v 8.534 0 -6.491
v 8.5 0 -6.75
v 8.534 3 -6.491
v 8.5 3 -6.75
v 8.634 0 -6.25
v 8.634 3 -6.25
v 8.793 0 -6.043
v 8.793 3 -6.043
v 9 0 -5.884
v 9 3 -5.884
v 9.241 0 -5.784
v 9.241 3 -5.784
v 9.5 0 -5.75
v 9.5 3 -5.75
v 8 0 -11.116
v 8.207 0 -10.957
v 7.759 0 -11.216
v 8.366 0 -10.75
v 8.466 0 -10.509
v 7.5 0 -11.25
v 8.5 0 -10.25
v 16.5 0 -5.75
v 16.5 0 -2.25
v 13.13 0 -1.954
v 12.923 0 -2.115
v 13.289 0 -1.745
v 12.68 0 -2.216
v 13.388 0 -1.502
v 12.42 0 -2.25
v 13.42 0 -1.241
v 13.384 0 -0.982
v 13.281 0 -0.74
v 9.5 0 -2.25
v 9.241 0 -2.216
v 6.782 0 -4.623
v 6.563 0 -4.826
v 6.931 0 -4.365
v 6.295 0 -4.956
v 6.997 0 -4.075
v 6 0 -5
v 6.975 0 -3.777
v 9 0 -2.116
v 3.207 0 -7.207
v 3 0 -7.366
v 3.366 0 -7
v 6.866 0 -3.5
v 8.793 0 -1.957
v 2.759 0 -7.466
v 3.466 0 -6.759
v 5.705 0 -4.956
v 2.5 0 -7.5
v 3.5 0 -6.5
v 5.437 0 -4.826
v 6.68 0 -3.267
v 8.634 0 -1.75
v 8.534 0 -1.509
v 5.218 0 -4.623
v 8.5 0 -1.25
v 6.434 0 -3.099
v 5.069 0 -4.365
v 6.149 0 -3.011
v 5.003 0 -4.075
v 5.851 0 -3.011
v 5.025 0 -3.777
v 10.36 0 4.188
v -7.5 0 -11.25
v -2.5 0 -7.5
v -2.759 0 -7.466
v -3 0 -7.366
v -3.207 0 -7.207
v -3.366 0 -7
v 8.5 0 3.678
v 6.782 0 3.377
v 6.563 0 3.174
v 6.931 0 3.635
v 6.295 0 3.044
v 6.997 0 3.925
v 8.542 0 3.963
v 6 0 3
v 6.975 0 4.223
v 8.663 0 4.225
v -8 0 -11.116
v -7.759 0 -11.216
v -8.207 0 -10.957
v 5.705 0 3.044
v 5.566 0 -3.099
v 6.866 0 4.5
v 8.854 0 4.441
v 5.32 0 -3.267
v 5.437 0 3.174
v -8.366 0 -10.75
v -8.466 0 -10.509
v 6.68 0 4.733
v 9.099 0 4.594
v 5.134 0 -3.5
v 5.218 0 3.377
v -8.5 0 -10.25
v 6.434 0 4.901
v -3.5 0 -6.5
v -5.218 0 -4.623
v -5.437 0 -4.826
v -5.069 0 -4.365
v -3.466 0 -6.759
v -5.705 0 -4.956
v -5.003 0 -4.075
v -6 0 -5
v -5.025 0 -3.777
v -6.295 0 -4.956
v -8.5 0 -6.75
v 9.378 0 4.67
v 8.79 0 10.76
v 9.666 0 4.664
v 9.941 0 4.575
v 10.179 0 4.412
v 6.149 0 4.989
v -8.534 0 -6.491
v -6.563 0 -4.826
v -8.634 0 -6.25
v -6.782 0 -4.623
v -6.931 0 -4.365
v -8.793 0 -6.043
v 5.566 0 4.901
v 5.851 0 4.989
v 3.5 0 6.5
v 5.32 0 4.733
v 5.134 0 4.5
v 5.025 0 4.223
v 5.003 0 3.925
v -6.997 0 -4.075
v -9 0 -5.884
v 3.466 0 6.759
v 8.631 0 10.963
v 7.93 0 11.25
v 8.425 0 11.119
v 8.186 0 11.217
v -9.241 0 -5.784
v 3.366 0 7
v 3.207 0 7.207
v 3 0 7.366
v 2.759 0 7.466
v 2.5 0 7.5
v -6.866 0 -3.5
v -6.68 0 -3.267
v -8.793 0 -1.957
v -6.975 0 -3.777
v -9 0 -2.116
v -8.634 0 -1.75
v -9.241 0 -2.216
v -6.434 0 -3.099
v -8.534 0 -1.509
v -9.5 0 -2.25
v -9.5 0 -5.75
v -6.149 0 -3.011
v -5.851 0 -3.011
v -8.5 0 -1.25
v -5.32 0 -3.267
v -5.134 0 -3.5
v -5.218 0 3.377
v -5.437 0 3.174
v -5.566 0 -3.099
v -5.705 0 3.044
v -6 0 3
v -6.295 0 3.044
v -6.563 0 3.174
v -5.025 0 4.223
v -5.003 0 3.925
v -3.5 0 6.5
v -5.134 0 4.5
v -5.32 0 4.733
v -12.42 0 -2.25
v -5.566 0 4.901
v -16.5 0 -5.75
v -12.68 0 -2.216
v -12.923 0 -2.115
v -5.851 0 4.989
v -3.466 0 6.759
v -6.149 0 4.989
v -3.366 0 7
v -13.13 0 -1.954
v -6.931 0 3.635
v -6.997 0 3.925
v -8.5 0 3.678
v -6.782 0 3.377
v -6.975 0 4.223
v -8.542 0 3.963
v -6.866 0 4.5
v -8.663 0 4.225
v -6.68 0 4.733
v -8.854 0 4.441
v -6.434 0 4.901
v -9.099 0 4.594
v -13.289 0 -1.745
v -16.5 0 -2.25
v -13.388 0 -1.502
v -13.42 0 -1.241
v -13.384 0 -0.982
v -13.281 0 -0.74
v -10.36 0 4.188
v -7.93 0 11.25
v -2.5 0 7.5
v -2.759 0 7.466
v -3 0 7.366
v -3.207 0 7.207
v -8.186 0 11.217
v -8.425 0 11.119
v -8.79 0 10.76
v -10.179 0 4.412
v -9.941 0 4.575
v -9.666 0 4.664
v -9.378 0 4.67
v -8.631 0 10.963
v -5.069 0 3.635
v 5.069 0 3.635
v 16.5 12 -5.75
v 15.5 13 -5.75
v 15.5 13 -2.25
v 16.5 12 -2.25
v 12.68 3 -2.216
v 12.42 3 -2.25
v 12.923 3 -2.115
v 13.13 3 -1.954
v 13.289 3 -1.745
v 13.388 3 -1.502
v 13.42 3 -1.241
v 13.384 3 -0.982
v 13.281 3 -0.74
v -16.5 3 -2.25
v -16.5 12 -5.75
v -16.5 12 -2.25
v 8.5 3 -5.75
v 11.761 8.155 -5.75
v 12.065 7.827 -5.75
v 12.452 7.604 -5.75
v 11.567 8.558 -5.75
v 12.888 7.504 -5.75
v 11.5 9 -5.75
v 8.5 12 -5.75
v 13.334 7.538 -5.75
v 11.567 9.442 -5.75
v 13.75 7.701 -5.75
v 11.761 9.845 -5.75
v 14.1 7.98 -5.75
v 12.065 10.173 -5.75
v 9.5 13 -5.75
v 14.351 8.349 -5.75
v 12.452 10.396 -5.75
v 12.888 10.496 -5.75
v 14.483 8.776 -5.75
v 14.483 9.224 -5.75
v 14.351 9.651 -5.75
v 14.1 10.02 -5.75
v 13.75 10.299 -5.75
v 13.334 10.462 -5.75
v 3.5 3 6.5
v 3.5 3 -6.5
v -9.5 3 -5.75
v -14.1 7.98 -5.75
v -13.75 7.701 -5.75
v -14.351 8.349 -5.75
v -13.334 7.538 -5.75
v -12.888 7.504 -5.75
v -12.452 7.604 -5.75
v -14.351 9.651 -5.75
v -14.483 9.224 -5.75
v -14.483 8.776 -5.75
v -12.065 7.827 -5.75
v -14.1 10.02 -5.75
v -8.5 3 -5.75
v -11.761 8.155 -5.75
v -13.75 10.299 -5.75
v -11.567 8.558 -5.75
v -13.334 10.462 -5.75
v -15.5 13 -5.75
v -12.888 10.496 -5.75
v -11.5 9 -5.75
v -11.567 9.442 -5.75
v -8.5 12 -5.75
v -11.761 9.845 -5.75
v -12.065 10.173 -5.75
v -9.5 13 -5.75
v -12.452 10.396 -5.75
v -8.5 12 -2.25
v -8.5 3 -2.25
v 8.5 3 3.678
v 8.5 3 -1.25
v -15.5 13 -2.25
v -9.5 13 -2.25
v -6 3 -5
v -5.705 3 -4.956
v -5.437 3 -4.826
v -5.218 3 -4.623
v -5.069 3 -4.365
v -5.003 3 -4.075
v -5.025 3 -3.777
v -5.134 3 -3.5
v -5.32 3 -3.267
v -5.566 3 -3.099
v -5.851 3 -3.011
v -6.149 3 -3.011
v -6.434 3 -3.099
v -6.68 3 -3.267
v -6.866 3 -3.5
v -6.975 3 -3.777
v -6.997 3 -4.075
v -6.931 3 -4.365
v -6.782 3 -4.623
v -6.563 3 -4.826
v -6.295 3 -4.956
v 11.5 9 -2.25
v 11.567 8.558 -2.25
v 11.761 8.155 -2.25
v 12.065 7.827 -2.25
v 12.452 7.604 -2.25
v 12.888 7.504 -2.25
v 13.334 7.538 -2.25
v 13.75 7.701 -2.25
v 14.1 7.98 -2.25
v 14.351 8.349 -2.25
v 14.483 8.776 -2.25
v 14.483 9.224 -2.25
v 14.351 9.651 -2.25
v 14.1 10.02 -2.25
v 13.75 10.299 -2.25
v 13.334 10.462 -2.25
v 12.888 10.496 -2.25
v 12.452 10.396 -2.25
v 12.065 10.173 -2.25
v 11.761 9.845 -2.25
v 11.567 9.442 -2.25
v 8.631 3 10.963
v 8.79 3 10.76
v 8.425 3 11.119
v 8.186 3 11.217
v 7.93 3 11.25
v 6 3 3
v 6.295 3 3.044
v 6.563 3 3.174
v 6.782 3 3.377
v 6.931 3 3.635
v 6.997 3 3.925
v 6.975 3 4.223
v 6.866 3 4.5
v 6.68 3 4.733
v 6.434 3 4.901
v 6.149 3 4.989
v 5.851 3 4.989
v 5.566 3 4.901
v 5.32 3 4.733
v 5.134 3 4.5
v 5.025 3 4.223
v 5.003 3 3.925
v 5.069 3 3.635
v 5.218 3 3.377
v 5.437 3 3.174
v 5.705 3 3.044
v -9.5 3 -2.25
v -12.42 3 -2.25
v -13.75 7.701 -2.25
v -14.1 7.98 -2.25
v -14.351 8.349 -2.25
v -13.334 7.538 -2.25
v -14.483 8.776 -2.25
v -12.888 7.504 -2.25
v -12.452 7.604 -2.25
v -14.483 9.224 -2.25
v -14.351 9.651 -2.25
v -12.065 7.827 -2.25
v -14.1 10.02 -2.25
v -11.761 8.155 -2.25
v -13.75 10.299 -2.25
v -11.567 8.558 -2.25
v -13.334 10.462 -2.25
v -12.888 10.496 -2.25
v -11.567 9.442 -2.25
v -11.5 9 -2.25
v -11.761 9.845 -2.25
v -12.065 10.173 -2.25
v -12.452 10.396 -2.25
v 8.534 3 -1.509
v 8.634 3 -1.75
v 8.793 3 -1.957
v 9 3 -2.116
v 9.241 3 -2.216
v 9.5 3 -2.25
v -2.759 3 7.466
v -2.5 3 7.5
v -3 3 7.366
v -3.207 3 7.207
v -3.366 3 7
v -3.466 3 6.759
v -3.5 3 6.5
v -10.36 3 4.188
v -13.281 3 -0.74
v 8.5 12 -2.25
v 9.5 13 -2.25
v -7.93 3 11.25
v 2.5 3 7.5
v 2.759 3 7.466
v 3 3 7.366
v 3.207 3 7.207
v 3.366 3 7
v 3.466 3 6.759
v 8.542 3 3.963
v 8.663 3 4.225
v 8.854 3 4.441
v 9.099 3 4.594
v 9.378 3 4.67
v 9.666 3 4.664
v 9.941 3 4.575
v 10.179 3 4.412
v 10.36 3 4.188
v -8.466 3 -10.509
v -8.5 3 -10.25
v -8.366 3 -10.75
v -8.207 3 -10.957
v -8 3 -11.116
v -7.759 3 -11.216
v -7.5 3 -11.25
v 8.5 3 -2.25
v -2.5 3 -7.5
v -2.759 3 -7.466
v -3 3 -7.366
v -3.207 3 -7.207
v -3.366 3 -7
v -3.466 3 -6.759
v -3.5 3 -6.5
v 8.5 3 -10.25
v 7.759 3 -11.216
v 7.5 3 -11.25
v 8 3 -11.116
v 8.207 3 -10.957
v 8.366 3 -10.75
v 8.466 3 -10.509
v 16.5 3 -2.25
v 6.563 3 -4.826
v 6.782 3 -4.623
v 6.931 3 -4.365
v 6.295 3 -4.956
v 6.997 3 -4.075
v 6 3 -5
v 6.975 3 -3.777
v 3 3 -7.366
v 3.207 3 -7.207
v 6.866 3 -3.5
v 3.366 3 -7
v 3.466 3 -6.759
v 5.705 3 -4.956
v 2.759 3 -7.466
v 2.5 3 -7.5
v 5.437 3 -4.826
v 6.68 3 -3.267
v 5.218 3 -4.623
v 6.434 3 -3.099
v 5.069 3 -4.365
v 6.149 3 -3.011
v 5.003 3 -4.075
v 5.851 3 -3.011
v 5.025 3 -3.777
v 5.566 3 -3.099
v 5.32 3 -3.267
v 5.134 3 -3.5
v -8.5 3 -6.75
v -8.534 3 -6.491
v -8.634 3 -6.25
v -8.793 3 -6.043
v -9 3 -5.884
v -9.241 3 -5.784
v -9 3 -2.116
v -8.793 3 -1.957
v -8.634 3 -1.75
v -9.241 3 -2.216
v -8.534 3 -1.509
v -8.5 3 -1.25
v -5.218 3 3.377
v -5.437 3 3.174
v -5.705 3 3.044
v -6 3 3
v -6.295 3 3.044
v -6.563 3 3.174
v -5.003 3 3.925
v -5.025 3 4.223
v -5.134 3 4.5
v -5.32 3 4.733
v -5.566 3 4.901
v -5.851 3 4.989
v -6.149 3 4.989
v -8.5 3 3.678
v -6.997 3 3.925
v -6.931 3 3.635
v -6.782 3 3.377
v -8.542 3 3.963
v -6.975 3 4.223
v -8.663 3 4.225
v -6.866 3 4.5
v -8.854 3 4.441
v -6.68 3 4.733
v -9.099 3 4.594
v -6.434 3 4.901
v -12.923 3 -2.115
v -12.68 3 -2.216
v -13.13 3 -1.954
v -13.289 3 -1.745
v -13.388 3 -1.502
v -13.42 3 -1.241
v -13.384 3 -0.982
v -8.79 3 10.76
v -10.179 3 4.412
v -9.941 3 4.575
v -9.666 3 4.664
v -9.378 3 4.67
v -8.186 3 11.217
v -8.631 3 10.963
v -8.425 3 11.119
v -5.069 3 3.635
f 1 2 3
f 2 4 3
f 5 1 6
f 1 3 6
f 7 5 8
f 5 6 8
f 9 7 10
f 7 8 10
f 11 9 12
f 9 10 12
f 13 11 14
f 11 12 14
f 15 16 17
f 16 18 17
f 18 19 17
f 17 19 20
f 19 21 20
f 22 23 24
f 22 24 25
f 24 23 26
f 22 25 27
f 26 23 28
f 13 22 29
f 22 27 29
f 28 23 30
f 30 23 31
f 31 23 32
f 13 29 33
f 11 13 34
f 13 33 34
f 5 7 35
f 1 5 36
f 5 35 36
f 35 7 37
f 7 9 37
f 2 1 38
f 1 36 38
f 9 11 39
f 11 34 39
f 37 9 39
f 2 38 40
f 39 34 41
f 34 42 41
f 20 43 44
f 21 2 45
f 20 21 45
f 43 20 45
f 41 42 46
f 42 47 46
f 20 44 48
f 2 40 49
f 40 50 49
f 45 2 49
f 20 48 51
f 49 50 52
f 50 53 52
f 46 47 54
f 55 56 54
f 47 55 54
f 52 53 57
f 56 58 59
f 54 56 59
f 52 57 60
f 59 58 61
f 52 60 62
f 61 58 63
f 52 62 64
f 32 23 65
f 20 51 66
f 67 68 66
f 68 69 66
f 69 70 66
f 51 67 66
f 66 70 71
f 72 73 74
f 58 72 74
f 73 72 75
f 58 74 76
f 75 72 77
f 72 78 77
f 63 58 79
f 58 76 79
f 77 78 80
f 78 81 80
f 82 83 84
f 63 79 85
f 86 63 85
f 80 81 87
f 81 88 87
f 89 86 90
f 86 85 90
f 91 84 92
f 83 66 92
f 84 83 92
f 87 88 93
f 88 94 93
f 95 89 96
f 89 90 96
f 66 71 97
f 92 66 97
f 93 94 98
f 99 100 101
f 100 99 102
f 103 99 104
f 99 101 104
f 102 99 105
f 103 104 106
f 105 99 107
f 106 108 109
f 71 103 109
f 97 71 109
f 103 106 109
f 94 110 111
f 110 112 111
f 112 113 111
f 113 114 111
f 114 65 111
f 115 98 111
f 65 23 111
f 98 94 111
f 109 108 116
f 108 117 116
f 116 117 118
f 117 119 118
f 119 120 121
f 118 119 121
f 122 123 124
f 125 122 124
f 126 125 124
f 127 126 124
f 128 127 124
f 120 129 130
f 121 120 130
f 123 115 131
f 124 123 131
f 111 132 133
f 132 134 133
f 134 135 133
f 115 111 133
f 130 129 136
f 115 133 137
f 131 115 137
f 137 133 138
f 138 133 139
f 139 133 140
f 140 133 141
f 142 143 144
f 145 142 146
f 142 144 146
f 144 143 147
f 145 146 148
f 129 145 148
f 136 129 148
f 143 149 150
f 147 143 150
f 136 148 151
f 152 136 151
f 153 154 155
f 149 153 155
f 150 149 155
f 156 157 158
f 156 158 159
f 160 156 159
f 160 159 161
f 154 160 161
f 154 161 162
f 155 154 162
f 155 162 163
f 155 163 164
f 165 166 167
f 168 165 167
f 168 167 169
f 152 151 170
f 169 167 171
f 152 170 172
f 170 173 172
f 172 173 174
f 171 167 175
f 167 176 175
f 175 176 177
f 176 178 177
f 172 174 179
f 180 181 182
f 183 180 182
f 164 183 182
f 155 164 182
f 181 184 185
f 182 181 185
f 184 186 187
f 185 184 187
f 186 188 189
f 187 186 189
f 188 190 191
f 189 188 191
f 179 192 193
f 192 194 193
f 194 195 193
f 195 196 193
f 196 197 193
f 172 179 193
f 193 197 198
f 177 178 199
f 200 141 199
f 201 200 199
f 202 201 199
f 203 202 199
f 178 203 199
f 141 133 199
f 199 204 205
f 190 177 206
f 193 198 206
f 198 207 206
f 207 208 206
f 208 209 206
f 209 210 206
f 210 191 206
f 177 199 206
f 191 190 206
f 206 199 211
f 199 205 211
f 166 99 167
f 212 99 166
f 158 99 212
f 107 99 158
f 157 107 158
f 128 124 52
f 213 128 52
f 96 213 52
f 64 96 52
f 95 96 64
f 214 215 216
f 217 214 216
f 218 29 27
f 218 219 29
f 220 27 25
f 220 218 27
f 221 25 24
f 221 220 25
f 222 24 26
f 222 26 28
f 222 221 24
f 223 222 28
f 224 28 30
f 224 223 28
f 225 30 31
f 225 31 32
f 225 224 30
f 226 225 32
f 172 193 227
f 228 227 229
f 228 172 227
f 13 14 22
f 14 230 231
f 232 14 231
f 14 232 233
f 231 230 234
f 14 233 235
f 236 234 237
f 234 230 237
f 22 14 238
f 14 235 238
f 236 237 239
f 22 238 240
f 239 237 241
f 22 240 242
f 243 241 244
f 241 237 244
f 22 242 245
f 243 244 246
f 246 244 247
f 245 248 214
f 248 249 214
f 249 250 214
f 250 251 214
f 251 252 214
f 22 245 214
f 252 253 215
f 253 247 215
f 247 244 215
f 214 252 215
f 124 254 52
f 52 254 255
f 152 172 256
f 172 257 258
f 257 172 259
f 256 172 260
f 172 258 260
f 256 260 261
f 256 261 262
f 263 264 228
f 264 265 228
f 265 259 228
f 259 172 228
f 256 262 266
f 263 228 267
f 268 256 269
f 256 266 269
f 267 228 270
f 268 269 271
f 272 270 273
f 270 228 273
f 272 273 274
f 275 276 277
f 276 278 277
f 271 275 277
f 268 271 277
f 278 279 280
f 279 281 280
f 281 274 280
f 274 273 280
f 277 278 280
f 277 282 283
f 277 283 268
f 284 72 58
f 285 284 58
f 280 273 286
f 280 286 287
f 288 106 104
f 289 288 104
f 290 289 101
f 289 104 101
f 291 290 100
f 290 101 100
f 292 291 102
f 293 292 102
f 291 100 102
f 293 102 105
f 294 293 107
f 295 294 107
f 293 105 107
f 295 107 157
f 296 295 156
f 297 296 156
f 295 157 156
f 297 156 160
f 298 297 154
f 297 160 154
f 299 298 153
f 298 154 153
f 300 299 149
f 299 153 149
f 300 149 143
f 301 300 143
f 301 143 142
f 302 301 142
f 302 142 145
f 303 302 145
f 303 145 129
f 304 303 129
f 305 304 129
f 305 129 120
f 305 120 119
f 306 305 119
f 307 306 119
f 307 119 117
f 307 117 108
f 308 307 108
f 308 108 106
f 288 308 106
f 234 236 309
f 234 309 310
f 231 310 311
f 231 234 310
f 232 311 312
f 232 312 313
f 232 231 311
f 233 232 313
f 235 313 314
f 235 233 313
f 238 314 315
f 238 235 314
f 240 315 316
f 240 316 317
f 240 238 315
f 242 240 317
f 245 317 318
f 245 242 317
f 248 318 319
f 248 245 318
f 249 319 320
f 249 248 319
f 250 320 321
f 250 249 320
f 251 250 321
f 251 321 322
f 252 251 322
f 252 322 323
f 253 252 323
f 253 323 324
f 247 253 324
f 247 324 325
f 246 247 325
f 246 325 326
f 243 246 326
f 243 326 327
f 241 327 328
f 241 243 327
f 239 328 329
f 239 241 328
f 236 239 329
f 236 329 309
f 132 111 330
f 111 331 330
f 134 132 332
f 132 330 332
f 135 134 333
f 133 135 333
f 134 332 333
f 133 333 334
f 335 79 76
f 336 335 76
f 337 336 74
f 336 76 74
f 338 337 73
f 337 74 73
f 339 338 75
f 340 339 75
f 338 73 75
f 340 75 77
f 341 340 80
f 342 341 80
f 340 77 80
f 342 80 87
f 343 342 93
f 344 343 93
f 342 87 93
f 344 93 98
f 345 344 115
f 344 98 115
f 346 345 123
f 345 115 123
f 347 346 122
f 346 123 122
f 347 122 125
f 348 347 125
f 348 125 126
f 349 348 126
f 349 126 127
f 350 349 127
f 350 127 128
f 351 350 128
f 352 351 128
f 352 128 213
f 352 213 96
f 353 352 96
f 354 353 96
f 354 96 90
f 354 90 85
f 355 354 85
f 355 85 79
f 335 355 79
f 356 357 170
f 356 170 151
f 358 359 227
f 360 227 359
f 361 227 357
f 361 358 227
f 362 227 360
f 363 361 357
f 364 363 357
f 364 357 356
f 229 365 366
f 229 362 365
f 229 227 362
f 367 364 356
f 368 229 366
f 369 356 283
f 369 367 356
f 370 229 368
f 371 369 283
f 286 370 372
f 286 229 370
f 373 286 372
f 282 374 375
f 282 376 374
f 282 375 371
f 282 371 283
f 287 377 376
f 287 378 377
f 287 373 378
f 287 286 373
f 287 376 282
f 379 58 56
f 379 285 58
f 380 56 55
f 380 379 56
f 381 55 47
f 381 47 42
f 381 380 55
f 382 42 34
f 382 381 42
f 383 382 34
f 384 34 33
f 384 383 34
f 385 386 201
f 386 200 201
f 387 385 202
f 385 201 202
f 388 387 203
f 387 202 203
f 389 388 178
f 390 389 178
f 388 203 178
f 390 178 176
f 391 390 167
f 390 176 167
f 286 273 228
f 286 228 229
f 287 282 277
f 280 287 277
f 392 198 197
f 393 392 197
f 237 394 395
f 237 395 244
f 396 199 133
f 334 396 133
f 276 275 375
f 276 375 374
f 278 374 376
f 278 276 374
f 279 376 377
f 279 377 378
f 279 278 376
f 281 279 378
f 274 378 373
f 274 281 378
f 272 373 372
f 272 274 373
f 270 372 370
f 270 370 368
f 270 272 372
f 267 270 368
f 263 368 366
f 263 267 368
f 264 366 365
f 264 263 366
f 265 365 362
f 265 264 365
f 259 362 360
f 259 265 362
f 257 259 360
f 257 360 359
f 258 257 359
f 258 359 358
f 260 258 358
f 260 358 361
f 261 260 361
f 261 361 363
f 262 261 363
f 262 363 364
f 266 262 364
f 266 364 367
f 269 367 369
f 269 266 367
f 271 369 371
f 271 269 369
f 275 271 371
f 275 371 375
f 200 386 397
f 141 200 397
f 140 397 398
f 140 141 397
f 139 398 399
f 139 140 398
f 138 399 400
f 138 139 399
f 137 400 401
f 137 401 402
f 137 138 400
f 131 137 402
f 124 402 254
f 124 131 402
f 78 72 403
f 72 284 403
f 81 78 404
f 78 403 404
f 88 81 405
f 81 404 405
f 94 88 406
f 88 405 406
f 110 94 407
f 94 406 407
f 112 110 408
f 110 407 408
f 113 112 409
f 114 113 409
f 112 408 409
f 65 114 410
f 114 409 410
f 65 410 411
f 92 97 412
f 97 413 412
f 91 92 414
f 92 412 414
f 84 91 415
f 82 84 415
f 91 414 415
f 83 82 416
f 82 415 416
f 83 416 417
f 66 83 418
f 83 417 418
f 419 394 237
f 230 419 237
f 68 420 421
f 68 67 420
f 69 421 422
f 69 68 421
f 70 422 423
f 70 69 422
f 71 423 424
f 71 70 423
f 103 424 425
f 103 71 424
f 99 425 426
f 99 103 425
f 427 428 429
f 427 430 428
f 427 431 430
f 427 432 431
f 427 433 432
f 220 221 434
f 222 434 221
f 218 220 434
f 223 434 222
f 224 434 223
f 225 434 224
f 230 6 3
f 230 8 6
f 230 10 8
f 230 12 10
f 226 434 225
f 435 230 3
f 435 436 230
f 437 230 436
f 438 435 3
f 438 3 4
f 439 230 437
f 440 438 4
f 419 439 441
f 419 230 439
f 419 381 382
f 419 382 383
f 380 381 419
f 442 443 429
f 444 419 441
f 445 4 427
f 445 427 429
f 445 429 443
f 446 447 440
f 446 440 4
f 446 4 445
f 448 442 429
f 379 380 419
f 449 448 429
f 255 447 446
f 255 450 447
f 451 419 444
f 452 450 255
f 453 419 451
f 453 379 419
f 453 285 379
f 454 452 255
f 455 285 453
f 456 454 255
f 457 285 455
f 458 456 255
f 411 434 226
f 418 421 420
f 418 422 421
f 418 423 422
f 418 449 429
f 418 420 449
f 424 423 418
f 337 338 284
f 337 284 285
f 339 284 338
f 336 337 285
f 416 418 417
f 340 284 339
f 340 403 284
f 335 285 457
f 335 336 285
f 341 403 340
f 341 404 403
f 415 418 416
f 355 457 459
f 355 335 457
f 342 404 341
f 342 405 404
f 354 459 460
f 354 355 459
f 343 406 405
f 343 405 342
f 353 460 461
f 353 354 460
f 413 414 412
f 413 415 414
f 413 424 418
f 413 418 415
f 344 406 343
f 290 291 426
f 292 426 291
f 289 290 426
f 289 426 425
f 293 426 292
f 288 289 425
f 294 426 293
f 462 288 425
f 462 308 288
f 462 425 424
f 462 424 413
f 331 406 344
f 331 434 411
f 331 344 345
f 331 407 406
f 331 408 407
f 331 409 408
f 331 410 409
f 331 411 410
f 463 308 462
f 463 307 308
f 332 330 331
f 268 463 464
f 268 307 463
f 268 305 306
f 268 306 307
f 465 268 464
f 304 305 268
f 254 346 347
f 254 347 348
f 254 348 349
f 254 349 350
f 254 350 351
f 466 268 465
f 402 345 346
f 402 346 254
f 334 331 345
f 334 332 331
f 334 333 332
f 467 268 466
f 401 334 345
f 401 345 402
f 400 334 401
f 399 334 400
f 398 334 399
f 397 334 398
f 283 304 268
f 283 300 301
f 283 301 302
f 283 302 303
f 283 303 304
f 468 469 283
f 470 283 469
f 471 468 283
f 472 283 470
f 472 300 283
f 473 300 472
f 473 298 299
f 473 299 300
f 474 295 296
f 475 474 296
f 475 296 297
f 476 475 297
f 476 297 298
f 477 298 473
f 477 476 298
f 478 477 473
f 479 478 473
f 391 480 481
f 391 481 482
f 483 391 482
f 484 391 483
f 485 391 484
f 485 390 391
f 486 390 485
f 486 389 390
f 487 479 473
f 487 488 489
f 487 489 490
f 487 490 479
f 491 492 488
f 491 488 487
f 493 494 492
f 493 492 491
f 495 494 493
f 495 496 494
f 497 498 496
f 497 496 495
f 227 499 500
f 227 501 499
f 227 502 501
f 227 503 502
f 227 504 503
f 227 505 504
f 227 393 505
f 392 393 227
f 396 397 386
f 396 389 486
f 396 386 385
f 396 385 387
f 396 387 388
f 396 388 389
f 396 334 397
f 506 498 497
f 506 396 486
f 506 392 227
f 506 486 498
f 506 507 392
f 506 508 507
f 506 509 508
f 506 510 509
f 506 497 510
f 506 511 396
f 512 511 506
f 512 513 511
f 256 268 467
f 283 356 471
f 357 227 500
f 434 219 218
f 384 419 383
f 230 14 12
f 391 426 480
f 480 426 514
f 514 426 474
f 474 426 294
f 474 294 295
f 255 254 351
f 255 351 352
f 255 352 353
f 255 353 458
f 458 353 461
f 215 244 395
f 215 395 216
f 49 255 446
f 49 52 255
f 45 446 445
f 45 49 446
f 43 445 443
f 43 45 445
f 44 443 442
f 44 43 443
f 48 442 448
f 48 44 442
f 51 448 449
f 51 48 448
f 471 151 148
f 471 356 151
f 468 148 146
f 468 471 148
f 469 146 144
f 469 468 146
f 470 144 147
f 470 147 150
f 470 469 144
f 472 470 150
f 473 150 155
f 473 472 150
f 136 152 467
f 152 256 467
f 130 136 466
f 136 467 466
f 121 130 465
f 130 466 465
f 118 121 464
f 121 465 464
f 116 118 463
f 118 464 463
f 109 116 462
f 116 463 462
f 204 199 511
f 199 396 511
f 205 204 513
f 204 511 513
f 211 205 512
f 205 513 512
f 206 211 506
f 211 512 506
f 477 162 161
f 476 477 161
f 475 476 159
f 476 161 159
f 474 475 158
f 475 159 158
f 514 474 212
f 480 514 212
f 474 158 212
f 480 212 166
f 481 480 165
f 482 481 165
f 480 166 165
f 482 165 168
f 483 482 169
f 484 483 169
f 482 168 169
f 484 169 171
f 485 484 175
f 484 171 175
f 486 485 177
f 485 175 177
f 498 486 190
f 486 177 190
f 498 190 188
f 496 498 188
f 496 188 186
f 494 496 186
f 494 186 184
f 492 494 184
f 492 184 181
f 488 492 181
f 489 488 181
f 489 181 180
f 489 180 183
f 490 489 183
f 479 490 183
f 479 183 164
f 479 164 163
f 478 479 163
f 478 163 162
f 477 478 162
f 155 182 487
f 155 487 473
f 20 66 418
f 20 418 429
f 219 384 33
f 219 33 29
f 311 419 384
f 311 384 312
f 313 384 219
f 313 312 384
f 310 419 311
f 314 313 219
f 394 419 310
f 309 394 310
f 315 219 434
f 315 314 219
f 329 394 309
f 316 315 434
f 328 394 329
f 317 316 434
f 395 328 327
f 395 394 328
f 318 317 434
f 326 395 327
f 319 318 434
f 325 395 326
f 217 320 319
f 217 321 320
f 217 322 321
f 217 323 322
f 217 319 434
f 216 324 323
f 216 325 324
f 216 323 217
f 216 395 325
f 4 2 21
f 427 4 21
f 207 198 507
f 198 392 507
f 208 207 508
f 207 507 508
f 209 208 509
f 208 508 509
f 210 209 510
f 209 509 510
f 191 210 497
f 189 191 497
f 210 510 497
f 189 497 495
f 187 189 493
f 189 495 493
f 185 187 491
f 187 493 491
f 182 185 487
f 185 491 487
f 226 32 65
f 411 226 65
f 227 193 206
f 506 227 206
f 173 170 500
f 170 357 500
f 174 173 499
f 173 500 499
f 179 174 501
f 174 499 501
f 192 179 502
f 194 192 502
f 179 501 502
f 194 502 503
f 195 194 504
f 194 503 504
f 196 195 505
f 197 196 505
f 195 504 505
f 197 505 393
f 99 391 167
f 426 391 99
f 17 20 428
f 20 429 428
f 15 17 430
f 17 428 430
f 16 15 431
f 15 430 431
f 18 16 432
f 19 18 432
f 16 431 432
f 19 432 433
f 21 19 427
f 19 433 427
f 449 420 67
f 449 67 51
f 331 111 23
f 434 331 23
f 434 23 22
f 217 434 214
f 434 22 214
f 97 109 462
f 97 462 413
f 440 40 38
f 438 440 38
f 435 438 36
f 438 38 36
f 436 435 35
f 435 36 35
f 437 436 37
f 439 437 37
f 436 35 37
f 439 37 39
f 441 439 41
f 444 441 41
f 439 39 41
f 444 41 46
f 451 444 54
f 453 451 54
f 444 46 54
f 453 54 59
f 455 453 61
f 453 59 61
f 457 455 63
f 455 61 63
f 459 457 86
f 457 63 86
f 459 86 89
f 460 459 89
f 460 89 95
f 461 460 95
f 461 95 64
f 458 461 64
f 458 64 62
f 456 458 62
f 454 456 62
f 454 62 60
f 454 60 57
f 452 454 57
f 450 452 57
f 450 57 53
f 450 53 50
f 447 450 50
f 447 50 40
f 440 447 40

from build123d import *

# Parameters (mm, degrees)
SKETCH_1_W          = 17
SKETCH_1_H          = 22.5
EXTRUDE_1_DEPTH     = 3
EXTRUDE_START       = 5.5
SKETCH_2_W          = 33
SKETCH_2_H          = 13
SKETCH_2_R          = 1.5
EXTRUDE_2_DEPTH     = 3.5
SKETCH_3_R          = 1
CUT_EXTRUDE_1_DEPTH = 24.828816588
SKETCH_4_W          = 17
SKETCH_4_H          = 3.5
CUT_EXTRUDE_2_DEPTH = 10
SKETCH_5_W          = 7
SKETCH_5_H          = 15
CUT_EXTRUDE_3_DEPTH = 23.334110683
EXTRUDE_3_DEPTH     = 3
FILLET_1_R          = 1
FILLET_2_R          = 1
CHAMFER_2_SIZE      = 1


with BuildPart() as part:
    # 草图1 → 凸台-拉伸1 (new body)
    with BuildSketch(Plane(origin=(0, 0, 0), x_dir=(1, 0, 0), z_dir=(0, 1, 0))):
        Rectangle(SKETCH_1_W, SKETCH_1_H)
    extrude(amount=EXTRUDE_1_DEPTH)

    # 草图2 → 凸台-拉伸2 (add)
    with BuildSketch(Plane.XY.offset(-11.25).offset(EXTRUDE_START)):
        with Locations((0, 6.5)):
            Rectangle(SKETCH_2_W, SKETCH_2_H)
        with Locations((-13, 9)):
            Circle(SKETCH_2_R, mode=Mode.SUBTRACT)
        with Locations(Location((13, 9, 0), (0, 0, 180))):
            Circle(SKETCH_2_R, mode=Mode.SUBTRACT)
    extrude(amount=EXTRUDE_2_DEPTH)

    # 草图3 → 切除-拉伸1 (cut, through all)
    with BuildSketch(Plane.XZ):
        with Locations(Location((6, -4, 0), (0, 0, 270))):
            Circle(SKETCH_3_R)
        with Locations(Location((-6, -4, 0), (0, 0, 270))):
            Circle(SKETCH_3_R)
        with Locations(Location((-6, 4, 0), (0, 0, 270))):
            Circle(SKETCH_3_R)
        with Locations(Location((6, 4, 0), (0, 0, 270))):
            Circle(SKETCH_3_R)
    extrude(amount=-CUT_EXTRUDE_1_DEPTH, mode=Mode.SUBTRACT)

    # 草图4 → 切除-拉伸2 (cut)
    with BuildSketch(Plane(origin=(0, 13, 0), x_dir=(1, 0, 0), z_dir=(0, 1, 0))):
        with Locations((0, 4)):
            Rectangle(SKETCH_4_W, SKETCH_4_H)
    extrude(amount=-CUT_EXTRUDE_2_DEPTH, mode=Mode.SUBTRACT)

    # 草图5 → 切除-拉伸3 (cut, through all)
    with BuildSketch(Plane(origin=(0, 3, 0), x_dir=(1, 0, 0), z_dir=(0, 1, 0))):
        Rectangle(SKETCH_5_W, SKETCH_5_H)
    extrude(amount=-CUT_EXTRUDE_3_DEPTH, mode=Mode.SUBTRACT)

    # 草图6 → 凸台-拉伸3 (add)
    with BuildSketch(Plane.XZ):
        Polygon((-16.5, -2.25), (-8.5, 11.25), (-8.5, 7.326911293), (-14.175206692, -2.25), align=None)
        Polygon((14.175206692, -2.25), (8.5, 7.326911293), (8.5, 11.25), (16.5, -2.25), align=None)
    extrude(amount=-EXTRUDE_3_DEPTH)

    # 圆角1
    fillet_1_edges = [part.edges().sort_by_distance(p)[0] for p in [
        (-8.5, 1.5, 7.326911293),
        (-14.175206692, 1.5, -2.25),
        (8.5, 1.5, 7.326911293),
        (14.175206692, 1.5, -2.25),
        (8.5, 1.5, -2.25),
        (-8.5, 1.5, -2.25),
        (3.5, 1.5, -7.5),
        (3.5, 1.5, 7.5),
        (-3.5, 1.5, 7.5),
        (-3.5, 1.5, -7.5),
    ]]
    fillet(fillet_1_edges, radius=FILLET_1_R)

    # 圆角2
    fillet_2_edges = [part.edges().sort_by_distance(p)[0] for p in [
        (8.5, 1.5, -5.75),
        (-8.5, 1.5, -5.75),
        (8.5, 1.5, 11.25),
        (-8.5, 1.5, 11.25),
        (-8.5, 1.5, -11.25),
        (8.5, 1.5, -11.25),
    ]]
    fillet(fillet_2_edges, radius=FILLET_2_R)

    # 倒角2
    chamfer_2_edges = [part.edges().sort_by_distance(p)[0] for p in [
        (16.5, 13, -4),
        (-16.5, 13, -4),
        (8.5, 13, -4),
        (-8.5, 13, -4),
    ]]
    chamfer(chamfer_2_edges, length=CHAMFER_2_SIZE)


solid = part.part
